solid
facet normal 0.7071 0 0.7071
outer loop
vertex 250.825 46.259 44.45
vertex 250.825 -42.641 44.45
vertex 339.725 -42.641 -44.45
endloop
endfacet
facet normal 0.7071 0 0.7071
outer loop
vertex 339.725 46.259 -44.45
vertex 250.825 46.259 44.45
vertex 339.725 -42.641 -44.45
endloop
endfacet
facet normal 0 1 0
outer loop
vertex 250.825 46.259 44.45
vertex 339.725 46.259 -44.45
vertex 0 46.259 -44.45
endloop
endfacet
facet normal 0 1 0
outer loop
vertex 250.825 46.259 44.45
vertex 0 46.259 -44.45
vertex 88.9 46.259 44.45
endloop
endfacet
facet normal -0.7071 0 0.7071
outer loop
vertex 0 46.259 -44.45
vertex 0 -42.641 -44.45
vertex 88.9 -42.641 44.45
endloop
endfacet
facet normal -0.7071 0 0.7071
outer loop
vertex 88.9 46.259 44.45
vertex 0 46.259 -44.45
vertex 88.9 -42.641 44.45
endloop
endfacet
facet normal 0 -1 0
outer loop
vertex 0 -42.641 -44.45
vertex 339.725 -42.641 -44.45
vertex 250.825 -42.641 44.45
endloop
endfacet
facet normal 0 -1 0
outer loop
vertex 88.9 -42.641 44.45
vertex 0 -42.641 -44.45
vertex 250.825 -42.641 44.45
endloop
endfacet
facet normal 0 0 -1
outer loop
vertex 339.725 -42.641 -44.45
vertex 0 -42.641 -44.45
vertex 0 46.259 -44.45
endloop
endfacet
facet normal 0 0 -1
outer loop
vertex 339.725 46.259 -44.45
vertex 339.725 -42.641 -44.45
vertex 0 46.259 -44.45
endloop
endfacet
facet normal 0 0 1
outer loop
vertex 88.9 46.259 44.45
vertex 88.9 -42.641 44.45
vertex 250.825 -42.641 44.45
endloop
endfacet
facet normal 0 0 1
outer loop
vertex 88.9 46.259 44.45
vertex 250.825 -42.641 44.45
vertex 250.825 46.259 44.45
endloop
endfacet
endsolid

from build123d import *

# Parameters (mm, degrees)
F0_W     = 88.9
F0_H     = 88.9
F1_DEPTH = 339.725
F3_DEPTH = 88.901
F5_DEPTH = 88.901


with BuildPart() as f1:
    # F0 (on Right) → F1 (new body)
    with BuildSketch(Plane.YZ):
        with Locations((1.808545, 0)):
            Rectangle(F0_W, F0_H)
    extrude(amount=F1_DEPTH)

    # F2 (on face) → F3 (cut, through all)
    with BuildSketch(Plane.XZ.offset(42.641455)):
        Polygon((0, 44.45), (0, -44.45), (88.9, 44.45), align=None)
    extrude(amount=-F3_DEPTH, mode=Mode.SUBTRACT)

    # F4 (on face) → F5 (cut, through all)
    with BuildSketch(Plane.XZ.offset(42.641455)):
        Polygon((250.825, 44.45), (339.725, -44.45), (339.725, 44.45), align=None)
    extrude(amount=-F5_DEPTH, mode=Mode.SUBTRACT)


solid = f1.part
